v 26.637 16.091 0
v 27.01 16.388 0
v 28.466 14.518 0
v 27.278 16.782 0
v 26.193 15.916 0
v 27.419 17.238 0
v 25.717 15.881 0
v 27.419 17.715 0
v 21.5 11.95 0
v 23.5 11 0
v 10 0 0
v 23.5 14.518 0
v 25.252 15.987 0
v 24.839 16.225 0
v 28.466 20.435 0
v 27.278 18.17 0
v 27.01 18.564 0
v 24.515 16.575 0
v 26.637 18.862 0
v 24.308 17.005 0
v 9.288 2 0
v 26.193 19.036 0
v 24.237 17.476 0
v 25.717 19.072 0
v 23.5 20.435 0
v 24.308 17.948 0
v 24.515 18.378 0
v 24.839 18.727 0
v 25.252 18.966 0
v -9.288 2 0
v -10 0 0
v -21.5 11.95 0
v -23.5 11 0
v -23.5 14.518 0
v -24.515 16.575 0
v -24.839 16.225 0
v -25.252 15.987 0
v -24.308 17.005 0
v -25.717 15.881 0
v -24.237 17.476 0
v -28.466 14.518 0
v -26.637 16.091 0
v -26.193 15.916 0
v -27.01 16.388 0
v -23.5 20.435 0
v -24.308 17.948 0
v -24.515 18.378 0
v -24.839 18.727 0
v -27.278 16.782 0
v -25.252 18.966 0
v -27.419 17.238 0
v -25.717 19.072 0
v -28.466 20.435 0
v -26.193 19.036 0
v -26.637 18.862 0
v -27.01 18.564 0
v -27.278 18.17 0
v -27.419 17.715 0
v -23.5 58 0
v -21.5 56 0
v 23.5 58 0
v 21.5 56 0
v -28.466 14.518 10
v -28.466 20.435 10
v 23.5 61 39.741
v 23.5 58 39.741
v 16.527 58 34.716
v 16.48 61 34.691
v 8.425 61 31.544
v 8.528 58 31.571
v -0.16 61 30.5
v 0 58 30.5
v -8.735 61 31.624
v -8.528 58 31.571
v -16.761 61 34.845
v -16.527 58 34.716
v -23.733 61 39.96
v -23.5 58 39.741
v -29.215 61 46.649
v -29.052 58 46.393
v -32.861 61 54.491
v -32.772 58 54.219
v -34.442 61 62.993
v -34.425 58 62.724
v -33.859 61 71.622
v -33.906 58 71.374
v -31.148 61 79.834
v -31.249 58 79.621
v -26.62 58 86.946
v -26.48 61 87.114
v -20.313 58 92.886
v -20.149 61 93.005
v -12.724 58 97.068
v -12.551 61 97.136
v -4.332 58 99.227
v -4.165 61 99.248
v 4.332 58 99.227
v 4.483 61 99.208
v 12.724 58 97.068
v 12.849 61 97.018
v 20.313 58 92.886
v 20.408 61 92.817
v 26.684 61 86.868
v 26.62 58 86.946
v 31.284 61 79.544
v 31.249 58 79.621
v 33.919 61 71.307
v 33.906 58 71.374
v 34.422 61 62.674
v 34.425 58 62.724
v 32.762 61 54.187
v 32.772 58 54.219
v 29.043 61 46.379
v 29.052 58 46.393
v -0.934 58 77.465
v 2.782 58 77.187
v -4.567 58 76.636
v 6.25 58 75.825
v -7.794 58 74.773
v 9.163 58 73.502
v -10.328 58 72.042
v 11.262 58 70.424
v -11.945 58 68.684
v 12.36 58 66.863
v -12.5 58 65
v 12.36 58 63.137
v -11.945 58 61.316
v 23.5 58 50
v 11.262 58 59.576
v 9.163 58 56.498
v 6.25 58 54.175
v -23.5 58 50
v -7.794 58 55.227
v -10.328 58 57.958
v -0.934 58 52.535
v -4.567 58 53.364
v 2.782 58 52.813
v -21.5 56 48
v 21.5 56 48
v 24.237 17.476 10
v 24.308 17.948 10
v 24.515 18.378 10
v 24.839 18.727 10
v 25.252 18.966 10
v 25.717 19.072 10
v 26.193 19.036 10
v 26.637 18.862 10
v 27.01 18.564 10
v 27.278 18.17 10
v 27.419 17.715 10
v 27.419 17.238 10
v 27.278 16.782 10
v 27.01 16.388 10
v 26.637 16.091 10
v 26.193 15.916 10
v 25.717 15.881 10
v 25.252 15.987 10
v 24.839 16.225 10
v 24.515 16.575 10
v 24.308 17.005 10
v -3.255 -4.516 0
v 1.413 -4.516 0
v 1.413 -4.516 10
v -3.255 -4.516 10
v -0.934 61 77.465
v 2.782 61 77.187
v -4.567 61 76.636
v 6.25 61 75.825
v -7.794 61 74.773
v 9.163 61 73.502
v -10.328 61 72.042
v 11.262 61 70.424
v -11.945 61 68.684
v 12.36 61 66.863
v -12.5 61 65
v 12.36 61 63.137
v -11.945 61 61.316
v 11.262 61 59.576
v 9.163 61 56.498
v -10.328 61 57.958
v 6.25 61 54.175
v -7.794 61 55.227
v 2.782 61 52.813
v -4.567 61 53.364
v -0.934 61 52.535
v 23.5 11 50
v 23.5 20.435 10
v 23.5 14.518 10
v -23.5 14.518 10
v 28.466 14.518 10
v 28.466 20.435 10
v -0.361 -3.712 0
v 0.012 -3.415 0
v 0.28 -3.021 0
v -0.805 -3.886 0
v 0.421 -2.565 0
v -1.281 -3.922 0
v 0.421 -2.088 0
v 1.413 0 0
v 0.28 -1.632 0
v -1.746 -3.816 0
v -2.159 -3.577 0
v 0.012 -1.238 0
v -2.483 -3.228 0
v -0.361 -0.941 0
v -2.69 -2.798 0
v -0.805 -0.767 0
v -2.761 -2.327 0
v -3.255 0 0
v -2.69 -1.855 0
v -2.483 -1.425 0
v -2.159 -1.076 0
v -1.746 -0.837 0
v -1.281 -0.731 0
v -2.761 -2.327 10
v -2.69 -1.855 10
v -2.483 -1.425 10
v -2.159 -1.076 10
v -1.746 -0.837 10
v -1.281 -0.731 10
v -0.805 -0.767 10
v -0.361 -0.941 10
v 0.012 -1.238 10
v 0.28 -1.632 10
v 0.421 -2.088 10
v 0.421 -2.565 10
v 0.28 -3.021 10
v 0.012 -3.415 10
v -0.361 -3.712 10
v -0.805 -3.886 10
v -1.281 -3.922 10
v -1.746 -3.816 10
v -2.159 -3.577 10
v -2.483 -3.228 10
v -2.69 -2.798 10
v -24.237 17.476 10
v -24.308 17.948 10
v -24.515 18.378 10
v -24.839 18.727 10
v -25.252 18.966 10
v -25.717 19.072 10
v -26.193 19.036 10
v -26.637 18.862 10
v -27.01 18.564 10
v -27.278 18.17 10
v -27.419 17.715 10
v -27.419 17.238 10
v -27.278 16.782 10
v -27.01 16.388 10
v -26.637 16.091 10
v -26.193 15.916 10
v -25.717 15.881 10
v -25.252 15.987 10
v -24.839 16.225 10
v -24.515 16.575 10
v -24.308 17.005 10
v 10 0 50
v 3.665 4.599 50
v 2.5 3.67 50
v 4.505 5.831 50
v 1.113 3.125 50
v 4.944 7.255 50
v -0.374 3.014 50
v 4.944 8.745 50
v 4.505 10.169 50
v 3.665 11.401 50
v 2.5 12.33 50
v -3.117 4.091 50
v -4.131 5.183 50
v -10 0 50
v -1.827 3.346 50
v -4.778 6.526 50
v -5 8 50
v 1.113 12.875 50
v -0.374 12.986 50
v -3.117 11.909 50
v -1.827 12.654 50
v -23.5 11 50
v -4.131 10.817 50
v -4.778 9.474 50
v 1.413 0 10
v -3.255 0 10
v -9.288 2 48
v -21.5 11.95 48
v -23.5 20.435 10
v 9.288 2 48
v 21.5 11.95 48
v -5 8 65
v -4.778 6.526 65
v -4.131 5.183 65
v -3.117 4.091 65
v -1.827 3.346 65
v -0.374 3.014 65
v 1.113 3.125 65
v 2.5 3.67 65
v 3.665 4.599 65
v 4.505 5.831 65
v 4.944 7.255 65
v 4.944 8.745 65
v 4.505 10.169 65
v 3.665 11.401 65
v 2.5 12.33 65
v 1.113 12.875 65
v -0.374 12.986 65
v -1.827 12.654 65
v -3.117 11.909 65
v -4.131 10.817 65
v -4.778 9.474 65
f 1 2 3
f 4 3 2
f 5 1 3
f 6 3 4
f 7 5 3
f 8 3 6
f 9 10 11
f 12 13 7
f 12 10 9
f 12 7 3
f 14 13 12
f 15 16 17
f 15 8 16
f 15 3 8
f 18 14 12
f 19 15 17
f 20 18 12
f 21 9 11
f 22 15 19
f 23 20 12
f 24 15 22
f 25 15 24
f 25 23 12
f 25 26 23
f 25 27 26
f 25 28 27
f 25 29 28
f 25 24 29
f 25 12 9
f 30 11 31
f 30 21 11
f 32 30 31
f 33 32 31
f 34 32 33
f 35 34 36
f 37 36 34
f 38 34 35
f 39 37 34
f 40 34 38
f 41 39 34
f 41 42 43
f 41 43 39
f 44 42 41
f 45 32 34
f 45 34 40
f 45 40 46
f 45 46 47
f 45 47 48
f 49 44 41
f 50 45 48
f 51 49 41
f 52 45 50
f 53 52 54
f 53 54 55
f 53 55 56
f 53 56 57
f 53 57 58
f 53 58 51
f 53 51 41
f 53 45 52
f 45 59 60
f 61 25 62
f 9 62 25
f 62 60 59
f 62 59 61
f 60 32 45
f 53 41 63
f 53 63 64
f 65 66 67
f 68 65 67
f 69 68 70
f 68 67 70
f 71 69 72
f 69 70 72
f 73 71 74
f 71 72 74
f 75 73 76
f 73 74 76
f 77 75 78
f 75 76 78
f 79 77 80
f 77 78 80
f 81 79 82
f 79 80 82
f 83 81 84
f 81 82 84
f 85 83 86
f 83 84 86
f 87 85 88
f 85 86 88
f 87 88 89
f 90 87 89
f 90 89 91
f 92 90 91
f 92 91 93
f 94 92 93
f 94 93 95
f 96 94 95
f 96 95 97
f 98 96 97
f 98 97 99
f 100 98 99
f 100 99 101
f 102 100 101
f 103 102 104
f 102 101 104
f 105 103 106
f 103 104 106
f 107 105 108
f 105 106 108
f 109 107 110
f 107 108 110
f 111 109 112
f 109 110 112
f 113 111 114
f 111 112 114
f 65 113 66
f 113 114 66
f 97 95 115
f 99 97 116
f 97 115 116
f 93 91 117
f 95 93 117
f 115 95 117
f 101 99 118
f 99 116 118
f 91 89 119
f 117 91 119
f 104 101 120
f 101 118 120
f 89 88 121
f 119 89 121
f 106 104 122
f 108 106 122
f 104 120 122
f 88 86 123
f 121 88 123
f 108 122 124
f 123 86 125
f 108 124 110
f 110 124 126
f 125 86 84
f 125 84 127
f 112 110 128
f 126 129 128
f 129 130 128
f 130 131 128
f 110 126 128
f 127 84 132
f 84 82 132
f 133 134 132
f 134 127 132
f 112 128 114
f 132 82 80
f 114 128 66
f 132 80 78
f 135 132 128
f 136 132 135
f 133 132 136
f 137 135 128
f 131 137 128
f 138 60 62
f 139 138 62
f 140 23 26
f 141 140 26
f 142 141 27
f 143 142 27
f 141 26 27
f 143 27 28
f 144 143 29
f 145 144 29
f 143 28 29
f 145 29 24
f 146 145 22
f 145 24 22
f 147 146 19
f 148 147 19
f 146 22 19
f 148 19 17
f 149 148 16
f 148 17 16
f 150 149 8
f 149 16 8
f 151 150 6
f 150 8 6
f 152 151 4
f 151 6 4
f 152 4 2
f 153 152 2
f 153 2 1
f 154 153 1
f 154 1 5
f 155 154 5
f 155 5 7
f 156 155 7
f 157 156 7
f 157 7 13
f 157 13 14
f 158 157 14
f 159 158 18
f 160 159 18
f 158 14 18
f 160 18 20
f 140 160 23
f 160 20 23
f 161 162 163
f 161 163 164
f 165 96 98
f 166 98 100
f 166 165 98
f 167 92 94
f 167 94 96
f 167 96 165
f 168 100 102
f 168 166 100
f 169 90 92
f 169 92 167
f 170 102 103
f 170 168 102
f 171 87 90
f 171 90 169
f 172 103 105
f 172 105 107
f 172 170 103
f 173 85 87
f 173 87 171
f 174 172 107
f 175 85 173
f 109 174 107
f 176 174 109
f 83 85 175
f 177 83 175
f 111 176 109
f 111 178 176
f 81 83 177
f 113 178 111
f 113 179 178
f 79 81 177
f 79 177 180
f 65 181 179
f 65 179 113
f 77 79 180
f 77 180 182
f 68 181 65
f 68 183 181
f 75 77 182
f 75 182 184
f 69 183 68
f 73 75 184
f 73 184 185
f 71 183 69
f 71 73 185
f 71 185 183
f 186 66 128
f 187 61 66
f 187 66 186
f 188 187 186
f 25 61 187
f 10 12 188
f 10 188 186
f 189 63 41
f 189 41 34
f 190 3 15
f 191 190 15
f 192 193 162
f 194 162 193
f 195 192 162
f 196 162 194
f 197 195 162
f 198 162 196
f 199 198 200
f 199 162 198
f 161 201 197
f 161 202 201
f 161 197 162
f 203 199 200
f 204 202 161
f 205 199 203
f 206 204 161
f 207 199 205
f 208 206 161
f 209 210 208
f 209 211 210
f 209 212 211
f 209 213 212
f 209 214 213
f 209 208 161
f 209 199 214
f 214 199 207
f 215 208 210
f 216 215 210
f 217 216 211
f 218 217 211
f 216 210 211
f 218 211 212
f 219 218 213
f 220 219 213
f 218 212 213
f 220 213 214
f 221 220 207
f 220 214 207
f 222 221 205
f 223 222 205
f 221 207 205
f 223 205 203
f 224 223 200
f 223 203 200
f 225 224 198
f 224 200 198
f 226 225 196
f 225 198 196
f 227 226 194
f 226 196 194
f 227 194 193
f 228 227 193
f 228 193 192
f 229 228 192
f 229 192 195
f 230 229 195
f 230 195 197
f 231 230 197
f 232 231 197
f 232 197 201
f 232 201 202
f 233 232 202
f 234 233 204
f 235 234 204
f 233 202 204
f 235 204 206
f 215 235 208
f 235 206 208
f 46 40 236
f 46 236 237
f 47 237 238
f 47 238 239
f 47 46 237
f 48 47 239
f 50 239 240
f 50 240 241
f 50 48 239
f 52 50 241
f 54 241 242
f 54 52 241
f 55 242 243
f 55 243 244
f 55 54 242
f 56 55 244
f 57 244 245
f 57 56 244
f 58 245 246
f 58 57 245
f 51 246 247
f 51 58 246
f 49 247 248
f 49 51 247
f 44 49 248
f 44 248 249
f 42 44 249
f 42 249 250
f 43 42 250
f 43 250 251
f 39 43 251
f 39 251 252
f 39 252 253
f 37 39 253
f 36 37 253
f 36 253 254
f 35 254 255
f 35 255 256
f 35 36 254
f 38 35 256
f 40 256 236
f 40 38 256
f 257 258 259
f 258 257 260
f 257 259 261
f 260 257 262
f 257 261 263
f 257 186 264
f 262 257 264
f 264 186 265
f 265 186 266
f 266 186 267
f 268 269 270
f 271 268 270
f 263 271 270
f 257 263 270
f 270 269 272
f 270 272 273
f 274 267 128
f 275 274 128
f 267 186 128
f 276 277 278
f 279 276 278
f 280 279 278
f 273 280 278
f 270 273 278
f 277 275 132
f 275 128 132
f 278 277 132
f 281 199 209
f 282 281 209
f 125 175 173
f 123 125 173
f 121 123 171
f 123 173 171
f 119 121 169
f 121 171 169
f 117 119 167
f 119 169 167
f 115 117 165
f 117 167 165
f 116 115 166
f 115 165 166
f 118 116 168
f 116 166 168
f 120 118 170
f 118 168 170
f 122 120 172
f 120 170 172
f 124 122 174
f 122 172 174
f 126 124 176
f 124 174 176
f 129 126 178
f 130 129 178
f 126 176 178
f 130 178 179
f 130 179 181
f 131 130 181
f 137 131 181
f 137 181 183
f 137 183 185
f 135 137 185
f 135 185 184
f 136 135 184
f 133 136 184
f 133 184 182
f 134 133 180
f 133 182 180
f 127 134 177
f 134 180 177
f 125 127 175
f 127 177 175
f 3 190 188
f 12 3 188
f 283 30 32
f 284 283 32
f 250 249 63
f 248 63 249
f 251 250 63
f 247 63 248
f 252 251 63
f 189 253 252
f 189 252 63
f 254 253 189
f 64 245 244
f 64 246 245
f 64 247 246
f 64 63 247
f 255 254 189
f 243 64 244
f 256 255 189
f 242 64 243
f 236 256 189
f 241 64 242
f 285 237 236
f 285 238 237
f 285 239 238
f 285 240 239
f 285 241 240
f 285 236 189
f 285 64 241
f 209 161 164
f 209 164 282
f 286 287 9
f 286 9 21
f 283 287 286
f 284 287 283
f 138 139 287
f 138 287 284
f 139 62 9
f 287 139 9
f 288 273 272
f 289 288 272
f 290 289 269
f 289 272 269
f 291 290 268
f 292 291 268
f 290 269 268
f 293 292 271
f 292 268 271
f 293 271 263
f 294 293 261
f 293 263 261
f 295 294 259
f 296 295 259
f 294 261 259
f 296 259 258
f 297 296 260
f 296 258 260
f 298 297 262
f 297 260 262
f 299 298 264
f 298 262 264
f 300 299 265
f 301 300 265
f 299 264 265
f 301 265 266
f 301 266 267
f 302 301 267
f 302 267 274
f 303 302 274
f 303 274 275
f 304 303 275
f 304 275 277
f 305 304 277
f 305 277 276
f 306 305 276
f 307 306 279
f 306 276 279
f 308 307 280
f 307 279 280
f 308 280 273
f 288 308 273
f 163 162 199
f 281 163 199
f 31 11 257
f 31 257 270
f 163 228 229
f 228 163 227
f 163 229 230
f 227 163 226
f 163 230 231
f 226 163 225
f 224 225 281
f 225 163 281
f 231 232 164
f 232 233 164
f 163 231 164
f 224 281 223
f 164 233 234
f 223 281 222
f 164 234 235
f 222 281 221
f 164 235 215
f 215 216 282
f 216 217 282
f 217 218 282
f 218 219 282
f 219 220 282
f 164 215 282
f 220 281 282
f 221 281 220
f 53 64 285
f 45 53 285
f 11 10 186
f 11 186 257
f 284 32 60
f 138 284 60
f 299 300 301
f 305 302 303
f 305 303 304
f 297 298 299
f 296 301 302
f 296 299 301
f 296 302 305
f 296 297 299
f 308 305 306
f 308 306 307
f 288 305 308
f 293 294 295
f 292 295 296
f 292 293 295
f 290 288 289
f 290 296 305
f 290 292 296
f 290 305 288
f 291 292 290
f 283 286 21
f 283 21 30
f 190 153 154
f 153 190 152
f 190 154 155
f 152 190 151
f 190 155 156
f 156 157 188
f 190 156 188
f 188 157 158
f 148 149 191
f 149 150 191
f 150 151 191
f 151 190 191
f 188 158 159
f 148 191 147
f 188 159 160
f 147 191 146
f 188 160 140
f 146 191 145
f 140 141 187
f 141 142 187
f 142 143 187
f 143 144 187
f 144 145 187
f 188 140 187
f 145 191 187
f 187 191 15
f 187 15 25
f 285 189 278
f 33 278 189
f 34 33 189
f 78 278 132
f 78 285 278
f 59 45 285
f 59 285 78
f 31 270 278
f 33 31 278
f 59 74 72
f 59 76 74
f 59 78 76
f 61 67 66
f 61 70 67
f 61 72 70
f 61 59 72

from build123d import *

# Parameters (mm, degrees)
EXTRUDE_1_DEPTH     = 50
CUT_EXTRUDE_1_DEPTH = 48
SKETCH_3_W          = 4.966361877
SKETCH_3_H          = 5.916795771
SKETCH_3_R          = 1.6
EXTRUDE_2_DEPTH     = 10
SKETCH_4_W          = 4.668240674
SKETCH_4_H          = 4.515988468
SKETCH_4_R          = 1.6
EXTRUDE_3_DEPTH     = 10
SKETCH_5_R          = 5
EXTRUDE_4_DEPTH     = 15
SKETCH_8_R          = 34.5
EXTRUDE_6_DEPTH     = 3
SKETCH_9_R          = 12.5
CUT_EXTRUDE_3_DEPTH = 3


with BuildPart() as part:
    # 草图1 → 凸台-拉伸1 (new body)
    with BuildSketch(Plane.XY):
        Polygon((10, 0), (-10, 0), (-23.5, 11), (-23.5, 58), (23.5, 58), (23.5, 11), align=None)
    extrude(amount=EXTRUDE_1_DEPTH)

    # 草图2 → 切除-拉伸1 (cut)
    with BuildSketch(Plane(origin=(0, 0, 0), x_dir=(-1, 0, 0), z_dir=(0, 0, -1))):
        Polygon((9.288350042, 2), (21.5, 11.950233299), (21.5, 56), (-21.5, 56), (-21.5, 11.950233299), (-9.288350042, 2), align=None)
    extrude(amount=-CUT_EXTRUDE_1_DEPTH, mode=Mode.SUBTRACT)

    # 草图3 → 凸台-拉伸2 (add)
    with BuildSketch(Plane(origin=(0, 0, 0), x_dir=(-1, 0, 0), z_dir=(0, 0, -1))):
        with Locations((-25.983180938, 17.476199431)):
            Rectangle(SKETCH_3_W, SKETCH_3_H)
        with Locations((-25.836674867, 17.476199431)):
            Circle(SKETCH_3_R, mode=Mode.SUBTRACT)
    extrude_2 = extrude(amount=-EXTRUDE_2_DEPTH)

    # 镜向1: 凸台-拉伸2 across plane
    add(extrude_2.mirror(Plane(origin=(0, 0, 0), x_dir=(0, 0, 1), z_dir=(1, 0, 0))))

    # 草图5 → 凸台-拉伸4 (add)
    with BuildSketch(Plane.XY.offset(50)):
        with Locations(Location((0, 8, 0), (0, 0, 180))):
            Circle(SKETCH_5_R)
    extrude(amount=EXTRUDE_4_DEPTH)

    # 草图8 → 凸台-拉伸6 (add)
    with BuildSketch(Plane(origin=(0, 58, 0), x_dir=(1, 0, 0), z_dir=(0, 1, 0))):
        with Locations(Location((0, -65, 0), (0, 0, 47.065689197))):
            Circle(SKETCH_8_R)
    extrude(amount=EXTRUDE_6_DEPTH)

    # 草图9 → 切除-拉伸3 (cut)
    with BuildSketch(Plane(origin=(0, 61, 0), x_dir=(1, 0, 0), z_dir=(0, 1, 0))):
        with Locations(Location((0, -65, 0), (0, 0, 180))):
            Circle(SKETCH_9_R)
    extrude(amount=-CUT_EXTRUDE_3_DEPTH, mode=Mode.SUBTRACT)


with BuildPart() as body_2:
    # 草图4 → 凸台-拉伸3 (new body)
    with BuildSketch(Plane(origin=(0, 0, 0), x_dir=(-1, 0, 0), z_dir=(0, 0, -1))):
        with Locations((0.920796605, -2.257994234)):
            Rectangle(SKETCH_4_W, SKETCH_4_H)
        with Locations((1.161292115, -2.326519441)):
            Circle(SKETCH_4_R, mode=Mode.SUBTRACT)
    extrude(amount=-EXTRUDE_3_DEPTH)


solid = Compound([part.part, body_2.part])
